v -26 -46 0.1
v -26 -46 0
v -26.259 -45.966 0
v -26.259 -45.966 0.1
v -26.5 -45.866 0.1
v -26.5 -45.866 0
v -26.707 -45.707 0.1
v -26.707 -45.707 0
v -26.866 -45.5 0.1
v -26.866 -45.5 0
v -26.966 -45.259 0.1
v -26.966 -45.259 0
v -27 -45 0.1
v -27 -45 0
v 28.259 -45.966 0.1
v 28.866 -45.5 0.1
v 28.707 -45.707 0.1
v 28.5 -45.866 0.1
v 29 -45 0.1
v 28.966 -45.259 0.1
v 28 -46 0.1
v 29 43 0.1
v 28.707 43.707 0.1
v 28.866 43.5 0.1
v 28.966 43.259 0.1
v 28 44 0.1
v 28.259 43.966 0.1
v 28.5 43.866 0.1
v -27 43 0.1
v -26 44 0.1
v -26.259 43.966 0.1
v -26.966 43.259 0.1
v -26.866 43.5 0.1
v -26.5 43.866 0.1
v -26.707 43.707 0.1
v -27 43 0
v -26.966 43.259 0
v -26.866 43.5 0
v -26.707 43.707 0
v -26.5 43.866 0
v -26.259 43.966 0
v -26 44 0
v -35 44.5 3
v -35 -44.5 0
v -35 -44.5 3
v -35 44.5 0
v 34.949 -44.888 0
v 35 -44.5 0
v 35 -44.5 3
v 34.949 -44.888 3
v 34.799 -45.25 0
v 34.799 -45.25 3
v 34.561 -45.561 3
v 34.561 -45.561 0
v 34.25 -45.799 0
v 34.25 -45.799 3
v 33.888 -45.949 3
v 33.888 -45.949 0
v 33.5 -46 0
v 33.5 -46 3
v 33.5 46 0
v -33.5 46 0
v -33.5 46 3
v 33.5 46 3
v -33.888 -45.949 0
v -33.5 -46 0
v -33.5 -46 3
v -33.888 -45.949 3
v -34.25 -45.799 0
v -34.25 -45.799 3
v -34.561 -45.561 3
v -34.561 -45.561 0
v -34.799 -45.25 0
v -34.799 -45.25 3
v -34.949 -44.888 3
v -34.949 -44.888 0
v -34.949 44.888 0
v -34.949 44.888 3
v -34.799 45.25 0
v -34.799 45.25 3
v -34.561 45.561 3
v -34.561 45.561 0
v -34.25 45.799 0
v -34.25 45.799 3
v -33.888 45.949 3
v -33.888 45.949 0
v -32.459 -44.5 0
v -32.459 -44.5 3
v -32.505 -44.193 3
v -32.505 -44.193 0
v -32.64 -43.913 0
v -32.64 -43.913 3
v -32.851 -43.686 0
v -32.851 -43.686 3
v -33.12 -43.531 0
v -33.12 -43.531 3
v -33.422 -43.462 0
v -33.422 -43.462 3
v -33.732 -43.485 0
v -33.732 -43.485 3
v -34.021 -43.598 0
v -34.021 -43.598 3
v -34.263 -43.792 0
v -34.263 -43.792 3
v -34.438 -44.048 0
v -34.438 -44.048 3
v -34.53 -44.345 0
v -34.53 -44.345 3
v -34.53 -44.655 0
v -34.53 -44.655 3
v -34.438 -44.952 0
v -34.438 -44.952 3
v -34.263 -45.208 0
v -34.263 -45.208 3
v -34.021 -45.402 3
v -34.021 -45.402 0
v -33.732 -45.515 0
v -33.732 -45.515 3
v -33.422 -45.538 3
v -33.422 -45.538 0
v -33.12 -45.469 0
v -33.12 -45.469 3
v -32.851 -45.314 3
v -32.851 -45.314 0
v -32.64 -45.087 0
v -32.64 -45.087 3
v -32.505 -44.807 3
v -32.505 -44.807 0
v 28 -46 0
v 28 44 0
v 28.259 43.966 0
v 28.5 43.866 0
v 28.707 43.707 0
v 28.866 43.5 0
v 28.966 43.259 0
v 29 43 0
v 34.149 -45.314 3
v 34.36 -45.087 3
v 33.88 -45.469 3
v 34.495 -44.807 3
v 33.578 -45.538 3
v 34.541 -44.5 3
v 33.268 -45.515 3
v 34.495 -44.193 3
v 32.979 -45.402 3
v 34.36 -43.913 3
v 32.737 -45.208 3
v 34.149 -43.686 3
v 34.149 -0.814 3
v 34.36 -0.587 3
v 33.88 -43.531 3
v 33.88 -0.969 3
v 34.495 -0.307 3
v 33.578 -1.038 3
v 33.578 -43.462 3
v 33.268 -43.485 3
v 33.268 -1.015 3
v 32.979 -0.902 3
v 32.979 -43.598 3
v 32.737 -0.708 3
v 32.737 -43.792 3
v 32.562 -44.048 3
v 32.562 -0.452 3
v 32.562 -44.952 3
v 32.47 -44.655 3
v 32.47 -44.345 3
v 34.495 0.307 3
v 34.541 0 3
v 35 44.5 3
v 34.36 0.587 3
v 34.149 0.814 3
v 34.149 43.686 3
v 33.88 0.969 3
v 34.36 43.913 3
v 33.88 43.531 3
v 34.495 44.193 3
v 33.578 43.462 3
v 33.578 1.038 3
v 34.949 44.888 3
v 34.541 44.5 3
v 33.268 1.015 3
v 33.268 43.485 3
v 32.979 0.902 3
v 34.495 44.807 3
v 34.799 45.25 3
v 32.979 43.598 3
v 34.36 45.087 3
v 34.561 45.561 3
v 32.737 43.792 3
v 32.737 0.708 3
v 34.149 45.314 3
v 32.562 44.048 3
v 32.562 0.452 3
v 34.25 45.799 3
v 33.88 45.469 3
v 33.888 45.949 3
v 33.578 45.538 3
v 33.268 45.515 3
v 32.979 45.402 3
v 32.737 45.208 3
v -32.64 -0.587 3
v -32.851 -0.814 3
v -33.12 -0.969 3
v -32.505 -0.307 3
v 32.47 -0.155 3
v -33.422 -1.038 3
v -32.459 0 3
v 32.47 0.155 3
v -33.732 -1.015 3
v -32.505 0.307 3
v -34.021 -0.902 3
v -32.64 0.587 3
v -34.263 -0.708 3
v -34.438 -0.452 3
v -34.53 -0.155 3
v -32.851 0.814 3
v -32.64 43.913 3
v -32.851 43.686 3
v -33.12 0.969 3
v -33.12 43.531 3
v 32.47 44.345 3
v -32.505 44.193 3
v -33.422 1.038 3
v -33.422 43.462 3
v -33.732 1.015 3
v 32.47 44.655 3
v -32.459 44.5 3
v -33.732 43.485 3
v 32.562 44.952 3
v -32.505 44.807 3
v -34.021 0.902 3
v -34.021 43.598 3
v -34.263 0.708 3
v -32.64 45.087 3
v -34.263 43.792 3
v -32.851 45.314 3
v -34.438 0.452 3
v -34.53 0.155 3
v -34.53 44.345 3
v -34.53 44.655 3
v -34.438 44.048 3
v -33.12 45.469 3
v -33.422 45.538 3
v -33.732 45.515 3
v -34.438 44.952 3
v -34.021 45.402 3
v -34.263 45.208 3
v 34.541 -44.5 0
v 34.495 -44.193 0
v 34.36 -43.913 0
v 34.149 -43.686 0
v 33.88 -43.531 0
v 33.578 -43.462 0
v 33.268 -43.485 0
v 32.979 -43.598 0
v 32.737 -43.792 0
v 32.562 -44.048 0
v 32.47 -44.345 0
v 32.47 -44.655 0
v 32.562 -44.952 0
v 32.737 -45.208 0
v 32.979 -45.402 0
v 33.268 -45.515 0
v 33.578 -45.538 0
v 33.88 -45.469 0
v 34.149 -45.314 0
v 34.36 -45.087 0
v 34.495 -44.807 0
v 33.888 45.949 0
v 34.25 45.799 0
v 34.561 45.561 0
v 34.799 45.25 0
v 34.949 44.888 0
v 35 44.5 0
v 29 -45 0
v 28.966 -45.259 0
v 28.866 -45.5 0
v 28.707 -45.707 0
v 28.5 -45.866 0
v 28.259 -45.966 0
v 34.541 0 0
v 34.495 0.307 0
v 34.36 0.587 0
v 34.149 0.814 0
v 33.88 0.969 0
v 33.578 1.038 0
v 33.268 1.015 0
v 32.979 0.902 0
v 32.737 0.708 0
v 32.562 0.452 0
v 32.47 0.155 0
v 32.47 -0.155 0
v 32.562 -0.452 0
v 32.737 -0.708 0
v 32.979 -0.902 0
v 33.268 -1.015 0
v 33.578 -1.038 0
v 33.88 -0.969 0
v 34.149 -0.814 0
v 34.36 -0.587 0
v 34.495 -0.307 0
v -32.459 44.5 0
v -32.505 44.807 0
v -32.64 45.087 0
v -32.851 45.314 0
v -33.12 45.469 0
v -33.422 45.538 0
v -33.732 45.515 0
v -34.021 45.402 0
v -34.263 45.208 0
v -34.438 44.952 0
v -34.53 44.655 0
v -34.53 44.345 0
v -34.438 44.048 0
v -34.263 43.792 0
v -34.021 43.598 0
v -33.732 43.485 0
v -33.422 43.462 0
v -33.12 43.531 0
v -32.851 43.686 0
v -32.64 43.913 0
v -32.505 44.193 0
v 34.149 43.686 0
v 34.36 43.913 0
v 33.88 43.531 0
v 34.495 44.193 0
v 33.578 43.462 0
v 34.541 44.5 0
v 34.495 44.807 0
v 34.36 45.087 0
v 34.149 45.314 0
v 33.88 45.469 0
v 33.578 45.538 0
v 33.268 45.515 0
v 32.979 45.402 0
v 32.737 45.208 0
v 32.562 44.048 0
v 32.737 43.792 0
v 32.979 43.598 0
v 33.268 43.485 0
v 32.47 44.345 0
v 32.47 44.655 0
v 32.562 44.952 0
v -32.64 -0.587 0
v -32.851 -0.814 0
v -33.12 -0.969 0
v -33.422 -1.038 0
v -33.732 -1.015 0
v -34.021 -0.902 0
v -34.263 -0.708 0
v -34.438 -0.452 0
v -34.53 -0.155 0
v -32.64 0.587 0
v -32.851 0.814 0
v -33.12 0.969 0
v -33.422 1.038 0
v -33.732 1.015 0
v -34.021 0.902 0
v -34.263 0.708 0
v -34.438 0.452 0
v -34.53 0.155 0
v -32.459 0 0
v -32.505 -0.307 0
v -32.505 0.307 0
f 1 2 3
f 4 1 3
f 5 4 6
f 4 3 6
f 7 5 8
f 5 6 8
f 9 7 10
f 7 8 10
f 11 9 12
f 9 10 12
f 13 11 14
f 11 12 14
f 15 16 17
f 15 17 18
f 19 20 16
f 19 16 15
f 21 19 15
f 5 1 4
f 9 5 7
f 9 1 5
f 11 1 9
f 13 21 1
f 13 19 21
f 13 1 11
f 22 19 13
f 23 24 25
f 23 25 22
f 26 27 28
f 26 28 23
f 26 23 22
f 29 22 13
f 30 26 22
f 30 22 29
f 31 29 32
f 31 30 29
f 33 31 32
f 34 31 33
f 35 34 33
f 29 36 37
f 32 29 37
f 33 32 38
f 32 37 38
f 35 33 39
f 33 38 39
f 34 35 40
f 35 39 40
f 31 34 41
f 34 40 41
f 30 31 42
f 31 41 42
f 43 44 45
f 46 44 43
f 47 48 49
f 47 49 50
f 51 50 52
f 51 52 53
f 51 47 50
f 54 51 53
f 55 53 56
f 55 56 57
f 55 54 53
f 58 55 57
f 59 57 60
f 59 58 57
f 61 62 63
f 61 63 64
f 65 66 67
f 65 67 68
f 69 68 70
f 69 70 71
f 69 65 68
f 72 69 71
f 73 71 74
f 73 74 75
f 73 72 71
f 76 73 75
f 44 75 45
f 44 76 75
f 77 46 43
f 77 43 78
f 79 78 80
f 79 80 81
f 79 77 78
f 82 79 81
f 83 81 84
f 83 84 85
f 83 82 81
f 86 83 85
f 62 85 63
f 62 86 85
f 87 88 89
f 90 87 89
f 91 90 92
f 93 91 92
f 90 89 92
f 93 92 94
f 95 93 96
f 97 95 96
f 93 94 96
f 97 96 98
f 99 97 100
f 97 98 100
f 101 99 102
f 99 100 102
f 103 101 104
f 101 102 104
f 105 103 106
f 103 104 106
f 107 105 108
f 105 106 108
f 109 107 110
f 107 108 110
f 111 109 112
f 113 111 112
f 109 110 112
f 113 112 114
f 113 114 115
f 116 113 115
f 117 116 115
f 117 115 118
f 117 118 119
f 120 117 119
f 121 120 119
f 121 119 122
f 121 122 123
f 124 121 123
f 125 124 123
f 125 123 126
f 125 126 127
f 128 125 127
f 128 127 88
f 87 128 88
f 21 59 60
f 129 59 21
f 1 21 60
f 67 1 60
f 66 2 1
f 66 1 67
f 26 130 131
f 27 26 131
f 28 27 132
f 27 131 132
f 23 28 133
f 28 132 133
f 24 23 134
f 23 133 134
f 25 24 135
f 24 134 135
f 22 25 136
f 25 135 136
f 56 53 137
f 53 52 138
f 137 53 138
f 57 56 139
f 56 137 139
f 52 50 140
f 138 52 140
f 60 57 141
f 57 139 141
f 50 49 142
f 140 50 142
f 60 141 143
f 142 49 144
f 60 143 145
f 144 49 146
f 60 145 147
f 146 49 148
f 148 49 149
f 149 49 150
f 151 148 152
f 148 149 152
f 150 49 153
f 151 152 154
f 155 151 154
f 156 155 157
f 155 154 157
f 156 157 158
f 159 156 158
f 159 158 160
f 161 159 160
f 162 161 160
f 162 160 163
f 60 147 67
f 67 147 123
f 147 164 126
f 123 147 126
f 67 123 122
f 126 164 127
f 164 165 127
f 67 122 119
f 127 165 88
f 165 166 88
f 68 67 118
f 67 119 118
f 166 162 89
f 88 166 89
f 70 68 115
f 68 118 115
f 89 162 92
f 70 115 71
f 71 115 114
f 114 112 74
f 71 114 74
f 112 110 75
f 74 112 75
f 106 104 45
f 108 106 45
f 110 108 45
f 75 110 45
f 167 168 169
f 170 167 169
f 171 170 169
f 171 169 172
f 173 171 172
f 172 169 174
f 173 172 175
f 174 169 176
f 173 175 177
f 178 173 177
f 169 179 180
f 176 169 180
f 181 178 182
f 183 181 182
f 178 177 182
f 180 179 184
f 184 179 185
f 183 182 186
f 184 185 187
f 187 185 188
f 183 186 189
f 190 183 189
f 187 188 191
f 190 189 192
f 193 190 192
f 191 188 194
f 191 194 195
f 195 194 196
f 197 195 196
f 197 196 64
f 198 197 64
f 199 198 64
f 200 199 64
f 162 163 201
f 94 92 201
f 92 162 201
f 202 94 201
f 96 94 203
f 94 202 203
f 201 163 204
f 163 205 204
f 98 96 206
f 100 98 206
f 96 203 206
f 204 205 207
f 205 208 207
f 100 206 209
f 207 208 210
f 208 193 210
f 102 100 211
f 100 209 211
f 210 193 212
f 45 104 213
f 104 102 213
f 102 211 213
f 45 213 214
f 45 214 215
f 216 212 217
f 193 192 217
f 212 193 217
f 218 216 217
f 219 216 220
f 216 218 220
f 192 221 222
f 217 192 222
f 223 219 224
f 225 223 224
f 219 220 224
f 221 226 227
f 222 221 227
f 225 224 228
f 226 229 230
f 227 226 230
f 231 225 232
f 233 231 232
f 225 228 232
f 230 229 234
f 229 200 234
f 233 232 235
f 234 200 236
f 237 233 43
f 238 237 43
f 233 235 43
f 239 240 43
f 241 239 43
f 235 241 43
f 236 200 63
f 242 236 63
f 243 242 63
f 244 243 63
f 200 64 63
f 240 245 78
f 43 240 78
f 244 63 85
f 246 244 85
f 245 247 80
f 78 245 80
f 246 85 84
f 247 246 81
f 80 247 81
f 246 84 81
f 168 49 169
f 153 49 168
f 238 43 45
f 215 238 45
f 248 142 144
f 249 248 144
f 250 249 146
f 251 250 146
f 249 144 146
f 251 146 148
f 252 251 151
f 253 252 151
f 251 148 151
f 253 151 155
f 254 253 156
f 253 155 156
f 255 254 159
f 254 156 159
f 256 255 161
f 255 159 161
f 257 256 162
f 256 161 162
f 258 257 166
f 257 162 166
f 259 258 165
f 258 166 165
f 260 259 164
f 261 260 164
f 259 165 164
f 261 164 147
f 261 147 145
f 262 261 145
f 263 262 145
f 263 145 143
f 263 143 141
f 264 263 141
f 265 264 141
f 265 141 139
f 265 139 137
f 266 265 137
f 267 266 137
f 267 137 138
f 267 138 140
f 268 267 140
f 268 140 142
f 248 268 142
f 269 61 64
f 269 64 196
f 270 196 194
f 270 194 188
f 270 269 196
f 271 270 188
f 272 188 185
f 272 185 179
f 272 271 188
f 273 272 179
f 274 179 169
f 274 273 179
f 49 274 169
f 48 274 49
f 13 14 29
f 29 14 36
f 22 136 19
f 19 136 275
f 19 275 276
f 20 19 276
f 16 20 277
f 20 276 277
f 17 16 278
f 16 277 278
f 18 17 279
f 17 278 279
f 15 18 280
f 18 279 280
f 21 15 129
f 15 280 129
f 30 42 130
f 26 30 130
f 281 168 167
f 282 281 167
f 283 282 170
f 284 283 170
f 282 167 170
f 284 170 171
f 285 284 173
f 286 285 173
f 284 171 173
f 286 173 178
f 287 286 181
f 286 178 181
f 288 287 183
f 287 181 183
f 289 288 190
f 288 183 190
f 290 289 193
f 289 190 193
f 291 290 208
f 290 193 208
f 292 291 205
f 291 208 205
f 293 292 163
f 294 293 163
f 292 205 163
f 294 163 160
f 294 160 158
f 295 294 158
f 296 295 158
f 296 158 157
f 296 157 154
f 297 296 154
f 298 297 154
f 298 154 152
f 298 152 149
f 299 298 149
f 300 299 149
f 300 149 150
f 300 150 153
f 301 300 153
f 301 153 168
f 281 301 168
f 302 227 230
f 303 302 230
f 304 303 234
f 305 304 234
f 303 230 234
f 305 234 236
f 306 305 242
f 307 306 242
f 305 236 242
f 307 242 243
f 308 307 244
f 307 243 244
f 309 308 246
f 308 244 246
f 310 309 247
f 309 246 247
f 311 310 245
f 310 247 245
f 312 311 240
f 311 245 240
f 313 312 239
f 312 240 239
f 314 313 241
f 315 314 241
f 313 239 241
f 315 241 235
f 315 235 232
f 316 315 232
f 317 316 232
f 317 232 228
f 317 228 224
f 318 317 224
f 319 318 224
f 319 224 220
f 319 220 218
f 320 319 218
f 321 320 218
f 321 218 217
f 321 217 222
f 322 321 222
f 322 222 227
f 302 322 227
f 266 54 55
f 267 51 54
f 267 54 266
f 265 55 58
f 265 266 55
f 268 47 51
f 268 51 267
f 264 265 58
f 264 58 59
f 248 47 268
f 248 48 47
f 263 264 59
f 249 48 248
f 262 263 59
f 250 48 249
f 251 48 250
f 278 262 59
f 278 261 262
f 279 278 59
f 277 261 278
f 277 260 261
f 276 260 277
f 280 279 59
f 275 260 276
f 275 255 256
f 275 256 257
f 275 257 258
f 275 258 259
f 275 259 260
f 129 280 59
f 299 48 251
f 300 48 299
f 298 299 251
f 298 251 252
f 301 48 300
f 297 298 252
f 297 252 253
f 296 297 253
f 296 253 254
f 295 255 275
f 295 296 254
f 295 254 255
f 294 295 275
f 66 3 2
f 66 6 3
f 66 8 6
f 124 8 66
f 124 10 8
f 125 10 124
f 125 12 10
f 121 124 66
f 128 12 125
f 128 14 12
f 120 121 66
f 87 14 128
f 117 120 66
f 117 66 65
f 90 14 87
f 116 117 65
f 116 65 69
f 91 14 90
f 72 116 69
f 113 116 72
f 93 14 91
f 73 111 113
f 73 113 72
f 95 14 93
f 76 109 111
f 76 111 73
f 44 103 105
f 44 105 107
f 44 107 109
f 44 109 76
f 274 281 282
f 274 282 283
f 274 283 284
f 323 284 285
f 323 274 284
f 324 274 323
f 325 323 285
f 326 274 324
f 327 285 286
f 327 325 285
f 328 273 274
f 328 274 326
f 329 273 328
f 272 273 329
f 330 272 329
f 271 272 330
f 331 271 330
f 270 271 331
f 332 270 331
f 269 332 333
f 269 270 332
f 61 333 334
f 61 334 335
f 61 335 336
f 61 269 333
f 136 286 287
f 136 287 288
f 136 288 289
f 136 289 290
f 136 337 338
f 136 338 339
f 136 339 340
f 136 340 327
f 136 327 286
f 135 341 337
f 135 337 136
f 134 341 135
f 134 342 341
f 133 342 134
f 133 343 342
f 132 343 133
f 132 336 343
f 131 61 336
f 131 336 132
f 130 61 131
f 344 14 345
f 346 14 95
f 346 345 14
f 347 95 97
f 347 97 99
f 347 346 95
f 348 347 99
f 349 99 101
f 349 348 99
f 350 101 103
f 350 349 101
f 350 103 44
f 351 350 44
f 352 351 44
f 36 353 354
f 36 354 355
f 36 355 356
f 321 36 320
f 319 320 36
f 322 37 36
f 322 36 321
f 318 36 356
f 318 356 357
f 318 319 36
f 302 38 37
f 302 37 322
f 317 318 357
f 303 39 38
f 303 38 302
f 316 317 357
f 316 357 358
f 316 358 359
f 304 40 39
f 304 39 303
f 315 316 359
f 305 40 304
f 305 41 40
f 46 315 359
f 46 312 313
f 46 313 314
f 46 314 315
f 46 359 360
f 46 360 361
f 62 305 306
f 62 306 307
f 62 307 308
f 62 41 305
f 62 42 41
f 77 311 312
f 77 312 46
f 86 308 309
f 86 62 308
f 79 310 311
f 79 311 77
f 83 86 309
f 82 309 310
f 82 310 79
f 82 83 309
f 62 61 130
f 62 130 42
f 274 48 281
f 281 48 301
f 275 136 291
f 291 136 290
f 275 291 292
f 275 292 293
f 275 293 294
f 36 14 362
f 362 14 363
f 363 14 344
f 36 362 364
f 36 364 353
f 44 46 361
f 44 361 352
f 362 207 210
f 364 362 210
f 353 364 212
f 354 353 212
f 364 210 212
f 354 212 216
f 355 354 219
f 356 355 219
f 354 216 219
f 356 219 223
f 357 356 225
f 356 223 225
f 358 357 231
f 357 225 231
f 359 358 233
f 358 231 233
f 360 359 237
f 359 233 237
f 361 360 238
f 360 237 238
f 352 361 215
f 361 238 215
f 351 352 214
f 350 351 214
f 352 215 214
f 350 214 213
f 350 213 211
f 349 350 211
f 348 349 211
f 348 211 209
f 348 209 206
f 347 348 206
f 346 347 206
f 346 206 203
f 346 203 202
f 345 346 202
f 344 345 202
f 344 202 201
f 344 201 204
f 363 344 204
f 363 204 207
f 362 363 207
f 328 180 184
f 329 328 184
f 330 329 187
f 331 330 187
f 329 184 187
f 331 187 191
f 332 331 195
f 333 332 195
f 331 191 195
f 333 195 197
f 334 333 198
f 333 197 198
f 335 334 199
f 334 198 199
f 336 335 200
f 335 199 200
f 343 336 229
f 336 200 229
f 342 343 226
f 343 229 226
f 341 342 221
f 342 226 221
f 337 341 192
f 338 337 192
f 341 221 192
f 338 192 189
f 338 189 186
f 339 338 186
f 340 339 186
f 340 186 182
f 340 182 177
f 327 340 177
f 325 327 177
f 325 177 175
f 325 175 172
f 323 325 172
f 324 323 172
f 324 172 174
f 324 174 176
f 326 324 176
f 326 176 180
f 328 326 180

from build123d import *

# Parameters (mm, degrees)
BOSS_EXTRUDE1_DEPTH       = 3
TAP_DRILL_FOR_3_56_TAP1_D = 2.0828
CUT_EXTRUDE1_DEPTH        = 0.1


with BuildPart() as part:
    # Sketch1 → Boss-Extrude1 (new body)
    with BuildSketch(Plane.XY):
        with BuildLine():
            Line((-33.5, 46), (33.5, 46))
            ThreePointArc((33.5, 46), (34.560660172, 45.560660172), (35, 44.5))
            Line((35, 44.5), (35, -44.5))
            ThreePointArc((35, -44.5), (34.560660172, -45.560660172), (33.5, -46))
            Line((33.5, -46), (-33.5, -46))
            ThreePointArc((-33.5, -46), (-34.560660172, -45.560660172), (-35, -44.5))
            Line((-35, -44.5), (-35, 44.5))
            ThreePointArc((-35, 44.5), (-34.560660172, 45.560660172), (-33.5, 46))
        make_face()
    extrude(amount=BOSS_EXTRUDE1_DEPTH)

    # Tap Drill for #3-56 Tap1 (through all)
    with Locations(Plane(origin=(0, 0, 0), x_dir=(-1, 0, 0), z_dir=(0, 0, -1))):
        with Locations((-33.5, 44.5), (33.5, -44.5), (33.5, 0), (-33.5, 0), (-33.5, -44.5), (33.5, 44.5)):
            Hole(TAP_DRILL_FOR_3_56_TAP1_D / 2)

    # Sketch7 → Cut-Extrude1 (cut)
    with BuildSketch(Plane(origin=(0, 0, 0), x_dir=(-1, 0, 0), z_dir=(0, 0, -1))):
        with BuildLine():
            Line((26, 44), (-28, 44))
            ThreePointArc((-28, 44), (-28.707106781, 43.707106781), (-29, 43))
            Line((-29, 43), (-29, -45))
            ThreePointArc((-29, -45), (-28.707106781, -45.707106781), (-28, -46))
            Line((-28, -46), (26, -46))
            ThreePointArc((26, -46), (26.707106781, -45.707106781), (27, -45))
            Line((27, -45), (27, 43))
            ThreePointArc((27, 43), (26.707106781, 43.707106781), (26, 44))
        make_face()
    extrude(amount=-CUT_EXTRUDE1_DEPTH, mode=Mode.SUBTRACT)


solid = part.part
